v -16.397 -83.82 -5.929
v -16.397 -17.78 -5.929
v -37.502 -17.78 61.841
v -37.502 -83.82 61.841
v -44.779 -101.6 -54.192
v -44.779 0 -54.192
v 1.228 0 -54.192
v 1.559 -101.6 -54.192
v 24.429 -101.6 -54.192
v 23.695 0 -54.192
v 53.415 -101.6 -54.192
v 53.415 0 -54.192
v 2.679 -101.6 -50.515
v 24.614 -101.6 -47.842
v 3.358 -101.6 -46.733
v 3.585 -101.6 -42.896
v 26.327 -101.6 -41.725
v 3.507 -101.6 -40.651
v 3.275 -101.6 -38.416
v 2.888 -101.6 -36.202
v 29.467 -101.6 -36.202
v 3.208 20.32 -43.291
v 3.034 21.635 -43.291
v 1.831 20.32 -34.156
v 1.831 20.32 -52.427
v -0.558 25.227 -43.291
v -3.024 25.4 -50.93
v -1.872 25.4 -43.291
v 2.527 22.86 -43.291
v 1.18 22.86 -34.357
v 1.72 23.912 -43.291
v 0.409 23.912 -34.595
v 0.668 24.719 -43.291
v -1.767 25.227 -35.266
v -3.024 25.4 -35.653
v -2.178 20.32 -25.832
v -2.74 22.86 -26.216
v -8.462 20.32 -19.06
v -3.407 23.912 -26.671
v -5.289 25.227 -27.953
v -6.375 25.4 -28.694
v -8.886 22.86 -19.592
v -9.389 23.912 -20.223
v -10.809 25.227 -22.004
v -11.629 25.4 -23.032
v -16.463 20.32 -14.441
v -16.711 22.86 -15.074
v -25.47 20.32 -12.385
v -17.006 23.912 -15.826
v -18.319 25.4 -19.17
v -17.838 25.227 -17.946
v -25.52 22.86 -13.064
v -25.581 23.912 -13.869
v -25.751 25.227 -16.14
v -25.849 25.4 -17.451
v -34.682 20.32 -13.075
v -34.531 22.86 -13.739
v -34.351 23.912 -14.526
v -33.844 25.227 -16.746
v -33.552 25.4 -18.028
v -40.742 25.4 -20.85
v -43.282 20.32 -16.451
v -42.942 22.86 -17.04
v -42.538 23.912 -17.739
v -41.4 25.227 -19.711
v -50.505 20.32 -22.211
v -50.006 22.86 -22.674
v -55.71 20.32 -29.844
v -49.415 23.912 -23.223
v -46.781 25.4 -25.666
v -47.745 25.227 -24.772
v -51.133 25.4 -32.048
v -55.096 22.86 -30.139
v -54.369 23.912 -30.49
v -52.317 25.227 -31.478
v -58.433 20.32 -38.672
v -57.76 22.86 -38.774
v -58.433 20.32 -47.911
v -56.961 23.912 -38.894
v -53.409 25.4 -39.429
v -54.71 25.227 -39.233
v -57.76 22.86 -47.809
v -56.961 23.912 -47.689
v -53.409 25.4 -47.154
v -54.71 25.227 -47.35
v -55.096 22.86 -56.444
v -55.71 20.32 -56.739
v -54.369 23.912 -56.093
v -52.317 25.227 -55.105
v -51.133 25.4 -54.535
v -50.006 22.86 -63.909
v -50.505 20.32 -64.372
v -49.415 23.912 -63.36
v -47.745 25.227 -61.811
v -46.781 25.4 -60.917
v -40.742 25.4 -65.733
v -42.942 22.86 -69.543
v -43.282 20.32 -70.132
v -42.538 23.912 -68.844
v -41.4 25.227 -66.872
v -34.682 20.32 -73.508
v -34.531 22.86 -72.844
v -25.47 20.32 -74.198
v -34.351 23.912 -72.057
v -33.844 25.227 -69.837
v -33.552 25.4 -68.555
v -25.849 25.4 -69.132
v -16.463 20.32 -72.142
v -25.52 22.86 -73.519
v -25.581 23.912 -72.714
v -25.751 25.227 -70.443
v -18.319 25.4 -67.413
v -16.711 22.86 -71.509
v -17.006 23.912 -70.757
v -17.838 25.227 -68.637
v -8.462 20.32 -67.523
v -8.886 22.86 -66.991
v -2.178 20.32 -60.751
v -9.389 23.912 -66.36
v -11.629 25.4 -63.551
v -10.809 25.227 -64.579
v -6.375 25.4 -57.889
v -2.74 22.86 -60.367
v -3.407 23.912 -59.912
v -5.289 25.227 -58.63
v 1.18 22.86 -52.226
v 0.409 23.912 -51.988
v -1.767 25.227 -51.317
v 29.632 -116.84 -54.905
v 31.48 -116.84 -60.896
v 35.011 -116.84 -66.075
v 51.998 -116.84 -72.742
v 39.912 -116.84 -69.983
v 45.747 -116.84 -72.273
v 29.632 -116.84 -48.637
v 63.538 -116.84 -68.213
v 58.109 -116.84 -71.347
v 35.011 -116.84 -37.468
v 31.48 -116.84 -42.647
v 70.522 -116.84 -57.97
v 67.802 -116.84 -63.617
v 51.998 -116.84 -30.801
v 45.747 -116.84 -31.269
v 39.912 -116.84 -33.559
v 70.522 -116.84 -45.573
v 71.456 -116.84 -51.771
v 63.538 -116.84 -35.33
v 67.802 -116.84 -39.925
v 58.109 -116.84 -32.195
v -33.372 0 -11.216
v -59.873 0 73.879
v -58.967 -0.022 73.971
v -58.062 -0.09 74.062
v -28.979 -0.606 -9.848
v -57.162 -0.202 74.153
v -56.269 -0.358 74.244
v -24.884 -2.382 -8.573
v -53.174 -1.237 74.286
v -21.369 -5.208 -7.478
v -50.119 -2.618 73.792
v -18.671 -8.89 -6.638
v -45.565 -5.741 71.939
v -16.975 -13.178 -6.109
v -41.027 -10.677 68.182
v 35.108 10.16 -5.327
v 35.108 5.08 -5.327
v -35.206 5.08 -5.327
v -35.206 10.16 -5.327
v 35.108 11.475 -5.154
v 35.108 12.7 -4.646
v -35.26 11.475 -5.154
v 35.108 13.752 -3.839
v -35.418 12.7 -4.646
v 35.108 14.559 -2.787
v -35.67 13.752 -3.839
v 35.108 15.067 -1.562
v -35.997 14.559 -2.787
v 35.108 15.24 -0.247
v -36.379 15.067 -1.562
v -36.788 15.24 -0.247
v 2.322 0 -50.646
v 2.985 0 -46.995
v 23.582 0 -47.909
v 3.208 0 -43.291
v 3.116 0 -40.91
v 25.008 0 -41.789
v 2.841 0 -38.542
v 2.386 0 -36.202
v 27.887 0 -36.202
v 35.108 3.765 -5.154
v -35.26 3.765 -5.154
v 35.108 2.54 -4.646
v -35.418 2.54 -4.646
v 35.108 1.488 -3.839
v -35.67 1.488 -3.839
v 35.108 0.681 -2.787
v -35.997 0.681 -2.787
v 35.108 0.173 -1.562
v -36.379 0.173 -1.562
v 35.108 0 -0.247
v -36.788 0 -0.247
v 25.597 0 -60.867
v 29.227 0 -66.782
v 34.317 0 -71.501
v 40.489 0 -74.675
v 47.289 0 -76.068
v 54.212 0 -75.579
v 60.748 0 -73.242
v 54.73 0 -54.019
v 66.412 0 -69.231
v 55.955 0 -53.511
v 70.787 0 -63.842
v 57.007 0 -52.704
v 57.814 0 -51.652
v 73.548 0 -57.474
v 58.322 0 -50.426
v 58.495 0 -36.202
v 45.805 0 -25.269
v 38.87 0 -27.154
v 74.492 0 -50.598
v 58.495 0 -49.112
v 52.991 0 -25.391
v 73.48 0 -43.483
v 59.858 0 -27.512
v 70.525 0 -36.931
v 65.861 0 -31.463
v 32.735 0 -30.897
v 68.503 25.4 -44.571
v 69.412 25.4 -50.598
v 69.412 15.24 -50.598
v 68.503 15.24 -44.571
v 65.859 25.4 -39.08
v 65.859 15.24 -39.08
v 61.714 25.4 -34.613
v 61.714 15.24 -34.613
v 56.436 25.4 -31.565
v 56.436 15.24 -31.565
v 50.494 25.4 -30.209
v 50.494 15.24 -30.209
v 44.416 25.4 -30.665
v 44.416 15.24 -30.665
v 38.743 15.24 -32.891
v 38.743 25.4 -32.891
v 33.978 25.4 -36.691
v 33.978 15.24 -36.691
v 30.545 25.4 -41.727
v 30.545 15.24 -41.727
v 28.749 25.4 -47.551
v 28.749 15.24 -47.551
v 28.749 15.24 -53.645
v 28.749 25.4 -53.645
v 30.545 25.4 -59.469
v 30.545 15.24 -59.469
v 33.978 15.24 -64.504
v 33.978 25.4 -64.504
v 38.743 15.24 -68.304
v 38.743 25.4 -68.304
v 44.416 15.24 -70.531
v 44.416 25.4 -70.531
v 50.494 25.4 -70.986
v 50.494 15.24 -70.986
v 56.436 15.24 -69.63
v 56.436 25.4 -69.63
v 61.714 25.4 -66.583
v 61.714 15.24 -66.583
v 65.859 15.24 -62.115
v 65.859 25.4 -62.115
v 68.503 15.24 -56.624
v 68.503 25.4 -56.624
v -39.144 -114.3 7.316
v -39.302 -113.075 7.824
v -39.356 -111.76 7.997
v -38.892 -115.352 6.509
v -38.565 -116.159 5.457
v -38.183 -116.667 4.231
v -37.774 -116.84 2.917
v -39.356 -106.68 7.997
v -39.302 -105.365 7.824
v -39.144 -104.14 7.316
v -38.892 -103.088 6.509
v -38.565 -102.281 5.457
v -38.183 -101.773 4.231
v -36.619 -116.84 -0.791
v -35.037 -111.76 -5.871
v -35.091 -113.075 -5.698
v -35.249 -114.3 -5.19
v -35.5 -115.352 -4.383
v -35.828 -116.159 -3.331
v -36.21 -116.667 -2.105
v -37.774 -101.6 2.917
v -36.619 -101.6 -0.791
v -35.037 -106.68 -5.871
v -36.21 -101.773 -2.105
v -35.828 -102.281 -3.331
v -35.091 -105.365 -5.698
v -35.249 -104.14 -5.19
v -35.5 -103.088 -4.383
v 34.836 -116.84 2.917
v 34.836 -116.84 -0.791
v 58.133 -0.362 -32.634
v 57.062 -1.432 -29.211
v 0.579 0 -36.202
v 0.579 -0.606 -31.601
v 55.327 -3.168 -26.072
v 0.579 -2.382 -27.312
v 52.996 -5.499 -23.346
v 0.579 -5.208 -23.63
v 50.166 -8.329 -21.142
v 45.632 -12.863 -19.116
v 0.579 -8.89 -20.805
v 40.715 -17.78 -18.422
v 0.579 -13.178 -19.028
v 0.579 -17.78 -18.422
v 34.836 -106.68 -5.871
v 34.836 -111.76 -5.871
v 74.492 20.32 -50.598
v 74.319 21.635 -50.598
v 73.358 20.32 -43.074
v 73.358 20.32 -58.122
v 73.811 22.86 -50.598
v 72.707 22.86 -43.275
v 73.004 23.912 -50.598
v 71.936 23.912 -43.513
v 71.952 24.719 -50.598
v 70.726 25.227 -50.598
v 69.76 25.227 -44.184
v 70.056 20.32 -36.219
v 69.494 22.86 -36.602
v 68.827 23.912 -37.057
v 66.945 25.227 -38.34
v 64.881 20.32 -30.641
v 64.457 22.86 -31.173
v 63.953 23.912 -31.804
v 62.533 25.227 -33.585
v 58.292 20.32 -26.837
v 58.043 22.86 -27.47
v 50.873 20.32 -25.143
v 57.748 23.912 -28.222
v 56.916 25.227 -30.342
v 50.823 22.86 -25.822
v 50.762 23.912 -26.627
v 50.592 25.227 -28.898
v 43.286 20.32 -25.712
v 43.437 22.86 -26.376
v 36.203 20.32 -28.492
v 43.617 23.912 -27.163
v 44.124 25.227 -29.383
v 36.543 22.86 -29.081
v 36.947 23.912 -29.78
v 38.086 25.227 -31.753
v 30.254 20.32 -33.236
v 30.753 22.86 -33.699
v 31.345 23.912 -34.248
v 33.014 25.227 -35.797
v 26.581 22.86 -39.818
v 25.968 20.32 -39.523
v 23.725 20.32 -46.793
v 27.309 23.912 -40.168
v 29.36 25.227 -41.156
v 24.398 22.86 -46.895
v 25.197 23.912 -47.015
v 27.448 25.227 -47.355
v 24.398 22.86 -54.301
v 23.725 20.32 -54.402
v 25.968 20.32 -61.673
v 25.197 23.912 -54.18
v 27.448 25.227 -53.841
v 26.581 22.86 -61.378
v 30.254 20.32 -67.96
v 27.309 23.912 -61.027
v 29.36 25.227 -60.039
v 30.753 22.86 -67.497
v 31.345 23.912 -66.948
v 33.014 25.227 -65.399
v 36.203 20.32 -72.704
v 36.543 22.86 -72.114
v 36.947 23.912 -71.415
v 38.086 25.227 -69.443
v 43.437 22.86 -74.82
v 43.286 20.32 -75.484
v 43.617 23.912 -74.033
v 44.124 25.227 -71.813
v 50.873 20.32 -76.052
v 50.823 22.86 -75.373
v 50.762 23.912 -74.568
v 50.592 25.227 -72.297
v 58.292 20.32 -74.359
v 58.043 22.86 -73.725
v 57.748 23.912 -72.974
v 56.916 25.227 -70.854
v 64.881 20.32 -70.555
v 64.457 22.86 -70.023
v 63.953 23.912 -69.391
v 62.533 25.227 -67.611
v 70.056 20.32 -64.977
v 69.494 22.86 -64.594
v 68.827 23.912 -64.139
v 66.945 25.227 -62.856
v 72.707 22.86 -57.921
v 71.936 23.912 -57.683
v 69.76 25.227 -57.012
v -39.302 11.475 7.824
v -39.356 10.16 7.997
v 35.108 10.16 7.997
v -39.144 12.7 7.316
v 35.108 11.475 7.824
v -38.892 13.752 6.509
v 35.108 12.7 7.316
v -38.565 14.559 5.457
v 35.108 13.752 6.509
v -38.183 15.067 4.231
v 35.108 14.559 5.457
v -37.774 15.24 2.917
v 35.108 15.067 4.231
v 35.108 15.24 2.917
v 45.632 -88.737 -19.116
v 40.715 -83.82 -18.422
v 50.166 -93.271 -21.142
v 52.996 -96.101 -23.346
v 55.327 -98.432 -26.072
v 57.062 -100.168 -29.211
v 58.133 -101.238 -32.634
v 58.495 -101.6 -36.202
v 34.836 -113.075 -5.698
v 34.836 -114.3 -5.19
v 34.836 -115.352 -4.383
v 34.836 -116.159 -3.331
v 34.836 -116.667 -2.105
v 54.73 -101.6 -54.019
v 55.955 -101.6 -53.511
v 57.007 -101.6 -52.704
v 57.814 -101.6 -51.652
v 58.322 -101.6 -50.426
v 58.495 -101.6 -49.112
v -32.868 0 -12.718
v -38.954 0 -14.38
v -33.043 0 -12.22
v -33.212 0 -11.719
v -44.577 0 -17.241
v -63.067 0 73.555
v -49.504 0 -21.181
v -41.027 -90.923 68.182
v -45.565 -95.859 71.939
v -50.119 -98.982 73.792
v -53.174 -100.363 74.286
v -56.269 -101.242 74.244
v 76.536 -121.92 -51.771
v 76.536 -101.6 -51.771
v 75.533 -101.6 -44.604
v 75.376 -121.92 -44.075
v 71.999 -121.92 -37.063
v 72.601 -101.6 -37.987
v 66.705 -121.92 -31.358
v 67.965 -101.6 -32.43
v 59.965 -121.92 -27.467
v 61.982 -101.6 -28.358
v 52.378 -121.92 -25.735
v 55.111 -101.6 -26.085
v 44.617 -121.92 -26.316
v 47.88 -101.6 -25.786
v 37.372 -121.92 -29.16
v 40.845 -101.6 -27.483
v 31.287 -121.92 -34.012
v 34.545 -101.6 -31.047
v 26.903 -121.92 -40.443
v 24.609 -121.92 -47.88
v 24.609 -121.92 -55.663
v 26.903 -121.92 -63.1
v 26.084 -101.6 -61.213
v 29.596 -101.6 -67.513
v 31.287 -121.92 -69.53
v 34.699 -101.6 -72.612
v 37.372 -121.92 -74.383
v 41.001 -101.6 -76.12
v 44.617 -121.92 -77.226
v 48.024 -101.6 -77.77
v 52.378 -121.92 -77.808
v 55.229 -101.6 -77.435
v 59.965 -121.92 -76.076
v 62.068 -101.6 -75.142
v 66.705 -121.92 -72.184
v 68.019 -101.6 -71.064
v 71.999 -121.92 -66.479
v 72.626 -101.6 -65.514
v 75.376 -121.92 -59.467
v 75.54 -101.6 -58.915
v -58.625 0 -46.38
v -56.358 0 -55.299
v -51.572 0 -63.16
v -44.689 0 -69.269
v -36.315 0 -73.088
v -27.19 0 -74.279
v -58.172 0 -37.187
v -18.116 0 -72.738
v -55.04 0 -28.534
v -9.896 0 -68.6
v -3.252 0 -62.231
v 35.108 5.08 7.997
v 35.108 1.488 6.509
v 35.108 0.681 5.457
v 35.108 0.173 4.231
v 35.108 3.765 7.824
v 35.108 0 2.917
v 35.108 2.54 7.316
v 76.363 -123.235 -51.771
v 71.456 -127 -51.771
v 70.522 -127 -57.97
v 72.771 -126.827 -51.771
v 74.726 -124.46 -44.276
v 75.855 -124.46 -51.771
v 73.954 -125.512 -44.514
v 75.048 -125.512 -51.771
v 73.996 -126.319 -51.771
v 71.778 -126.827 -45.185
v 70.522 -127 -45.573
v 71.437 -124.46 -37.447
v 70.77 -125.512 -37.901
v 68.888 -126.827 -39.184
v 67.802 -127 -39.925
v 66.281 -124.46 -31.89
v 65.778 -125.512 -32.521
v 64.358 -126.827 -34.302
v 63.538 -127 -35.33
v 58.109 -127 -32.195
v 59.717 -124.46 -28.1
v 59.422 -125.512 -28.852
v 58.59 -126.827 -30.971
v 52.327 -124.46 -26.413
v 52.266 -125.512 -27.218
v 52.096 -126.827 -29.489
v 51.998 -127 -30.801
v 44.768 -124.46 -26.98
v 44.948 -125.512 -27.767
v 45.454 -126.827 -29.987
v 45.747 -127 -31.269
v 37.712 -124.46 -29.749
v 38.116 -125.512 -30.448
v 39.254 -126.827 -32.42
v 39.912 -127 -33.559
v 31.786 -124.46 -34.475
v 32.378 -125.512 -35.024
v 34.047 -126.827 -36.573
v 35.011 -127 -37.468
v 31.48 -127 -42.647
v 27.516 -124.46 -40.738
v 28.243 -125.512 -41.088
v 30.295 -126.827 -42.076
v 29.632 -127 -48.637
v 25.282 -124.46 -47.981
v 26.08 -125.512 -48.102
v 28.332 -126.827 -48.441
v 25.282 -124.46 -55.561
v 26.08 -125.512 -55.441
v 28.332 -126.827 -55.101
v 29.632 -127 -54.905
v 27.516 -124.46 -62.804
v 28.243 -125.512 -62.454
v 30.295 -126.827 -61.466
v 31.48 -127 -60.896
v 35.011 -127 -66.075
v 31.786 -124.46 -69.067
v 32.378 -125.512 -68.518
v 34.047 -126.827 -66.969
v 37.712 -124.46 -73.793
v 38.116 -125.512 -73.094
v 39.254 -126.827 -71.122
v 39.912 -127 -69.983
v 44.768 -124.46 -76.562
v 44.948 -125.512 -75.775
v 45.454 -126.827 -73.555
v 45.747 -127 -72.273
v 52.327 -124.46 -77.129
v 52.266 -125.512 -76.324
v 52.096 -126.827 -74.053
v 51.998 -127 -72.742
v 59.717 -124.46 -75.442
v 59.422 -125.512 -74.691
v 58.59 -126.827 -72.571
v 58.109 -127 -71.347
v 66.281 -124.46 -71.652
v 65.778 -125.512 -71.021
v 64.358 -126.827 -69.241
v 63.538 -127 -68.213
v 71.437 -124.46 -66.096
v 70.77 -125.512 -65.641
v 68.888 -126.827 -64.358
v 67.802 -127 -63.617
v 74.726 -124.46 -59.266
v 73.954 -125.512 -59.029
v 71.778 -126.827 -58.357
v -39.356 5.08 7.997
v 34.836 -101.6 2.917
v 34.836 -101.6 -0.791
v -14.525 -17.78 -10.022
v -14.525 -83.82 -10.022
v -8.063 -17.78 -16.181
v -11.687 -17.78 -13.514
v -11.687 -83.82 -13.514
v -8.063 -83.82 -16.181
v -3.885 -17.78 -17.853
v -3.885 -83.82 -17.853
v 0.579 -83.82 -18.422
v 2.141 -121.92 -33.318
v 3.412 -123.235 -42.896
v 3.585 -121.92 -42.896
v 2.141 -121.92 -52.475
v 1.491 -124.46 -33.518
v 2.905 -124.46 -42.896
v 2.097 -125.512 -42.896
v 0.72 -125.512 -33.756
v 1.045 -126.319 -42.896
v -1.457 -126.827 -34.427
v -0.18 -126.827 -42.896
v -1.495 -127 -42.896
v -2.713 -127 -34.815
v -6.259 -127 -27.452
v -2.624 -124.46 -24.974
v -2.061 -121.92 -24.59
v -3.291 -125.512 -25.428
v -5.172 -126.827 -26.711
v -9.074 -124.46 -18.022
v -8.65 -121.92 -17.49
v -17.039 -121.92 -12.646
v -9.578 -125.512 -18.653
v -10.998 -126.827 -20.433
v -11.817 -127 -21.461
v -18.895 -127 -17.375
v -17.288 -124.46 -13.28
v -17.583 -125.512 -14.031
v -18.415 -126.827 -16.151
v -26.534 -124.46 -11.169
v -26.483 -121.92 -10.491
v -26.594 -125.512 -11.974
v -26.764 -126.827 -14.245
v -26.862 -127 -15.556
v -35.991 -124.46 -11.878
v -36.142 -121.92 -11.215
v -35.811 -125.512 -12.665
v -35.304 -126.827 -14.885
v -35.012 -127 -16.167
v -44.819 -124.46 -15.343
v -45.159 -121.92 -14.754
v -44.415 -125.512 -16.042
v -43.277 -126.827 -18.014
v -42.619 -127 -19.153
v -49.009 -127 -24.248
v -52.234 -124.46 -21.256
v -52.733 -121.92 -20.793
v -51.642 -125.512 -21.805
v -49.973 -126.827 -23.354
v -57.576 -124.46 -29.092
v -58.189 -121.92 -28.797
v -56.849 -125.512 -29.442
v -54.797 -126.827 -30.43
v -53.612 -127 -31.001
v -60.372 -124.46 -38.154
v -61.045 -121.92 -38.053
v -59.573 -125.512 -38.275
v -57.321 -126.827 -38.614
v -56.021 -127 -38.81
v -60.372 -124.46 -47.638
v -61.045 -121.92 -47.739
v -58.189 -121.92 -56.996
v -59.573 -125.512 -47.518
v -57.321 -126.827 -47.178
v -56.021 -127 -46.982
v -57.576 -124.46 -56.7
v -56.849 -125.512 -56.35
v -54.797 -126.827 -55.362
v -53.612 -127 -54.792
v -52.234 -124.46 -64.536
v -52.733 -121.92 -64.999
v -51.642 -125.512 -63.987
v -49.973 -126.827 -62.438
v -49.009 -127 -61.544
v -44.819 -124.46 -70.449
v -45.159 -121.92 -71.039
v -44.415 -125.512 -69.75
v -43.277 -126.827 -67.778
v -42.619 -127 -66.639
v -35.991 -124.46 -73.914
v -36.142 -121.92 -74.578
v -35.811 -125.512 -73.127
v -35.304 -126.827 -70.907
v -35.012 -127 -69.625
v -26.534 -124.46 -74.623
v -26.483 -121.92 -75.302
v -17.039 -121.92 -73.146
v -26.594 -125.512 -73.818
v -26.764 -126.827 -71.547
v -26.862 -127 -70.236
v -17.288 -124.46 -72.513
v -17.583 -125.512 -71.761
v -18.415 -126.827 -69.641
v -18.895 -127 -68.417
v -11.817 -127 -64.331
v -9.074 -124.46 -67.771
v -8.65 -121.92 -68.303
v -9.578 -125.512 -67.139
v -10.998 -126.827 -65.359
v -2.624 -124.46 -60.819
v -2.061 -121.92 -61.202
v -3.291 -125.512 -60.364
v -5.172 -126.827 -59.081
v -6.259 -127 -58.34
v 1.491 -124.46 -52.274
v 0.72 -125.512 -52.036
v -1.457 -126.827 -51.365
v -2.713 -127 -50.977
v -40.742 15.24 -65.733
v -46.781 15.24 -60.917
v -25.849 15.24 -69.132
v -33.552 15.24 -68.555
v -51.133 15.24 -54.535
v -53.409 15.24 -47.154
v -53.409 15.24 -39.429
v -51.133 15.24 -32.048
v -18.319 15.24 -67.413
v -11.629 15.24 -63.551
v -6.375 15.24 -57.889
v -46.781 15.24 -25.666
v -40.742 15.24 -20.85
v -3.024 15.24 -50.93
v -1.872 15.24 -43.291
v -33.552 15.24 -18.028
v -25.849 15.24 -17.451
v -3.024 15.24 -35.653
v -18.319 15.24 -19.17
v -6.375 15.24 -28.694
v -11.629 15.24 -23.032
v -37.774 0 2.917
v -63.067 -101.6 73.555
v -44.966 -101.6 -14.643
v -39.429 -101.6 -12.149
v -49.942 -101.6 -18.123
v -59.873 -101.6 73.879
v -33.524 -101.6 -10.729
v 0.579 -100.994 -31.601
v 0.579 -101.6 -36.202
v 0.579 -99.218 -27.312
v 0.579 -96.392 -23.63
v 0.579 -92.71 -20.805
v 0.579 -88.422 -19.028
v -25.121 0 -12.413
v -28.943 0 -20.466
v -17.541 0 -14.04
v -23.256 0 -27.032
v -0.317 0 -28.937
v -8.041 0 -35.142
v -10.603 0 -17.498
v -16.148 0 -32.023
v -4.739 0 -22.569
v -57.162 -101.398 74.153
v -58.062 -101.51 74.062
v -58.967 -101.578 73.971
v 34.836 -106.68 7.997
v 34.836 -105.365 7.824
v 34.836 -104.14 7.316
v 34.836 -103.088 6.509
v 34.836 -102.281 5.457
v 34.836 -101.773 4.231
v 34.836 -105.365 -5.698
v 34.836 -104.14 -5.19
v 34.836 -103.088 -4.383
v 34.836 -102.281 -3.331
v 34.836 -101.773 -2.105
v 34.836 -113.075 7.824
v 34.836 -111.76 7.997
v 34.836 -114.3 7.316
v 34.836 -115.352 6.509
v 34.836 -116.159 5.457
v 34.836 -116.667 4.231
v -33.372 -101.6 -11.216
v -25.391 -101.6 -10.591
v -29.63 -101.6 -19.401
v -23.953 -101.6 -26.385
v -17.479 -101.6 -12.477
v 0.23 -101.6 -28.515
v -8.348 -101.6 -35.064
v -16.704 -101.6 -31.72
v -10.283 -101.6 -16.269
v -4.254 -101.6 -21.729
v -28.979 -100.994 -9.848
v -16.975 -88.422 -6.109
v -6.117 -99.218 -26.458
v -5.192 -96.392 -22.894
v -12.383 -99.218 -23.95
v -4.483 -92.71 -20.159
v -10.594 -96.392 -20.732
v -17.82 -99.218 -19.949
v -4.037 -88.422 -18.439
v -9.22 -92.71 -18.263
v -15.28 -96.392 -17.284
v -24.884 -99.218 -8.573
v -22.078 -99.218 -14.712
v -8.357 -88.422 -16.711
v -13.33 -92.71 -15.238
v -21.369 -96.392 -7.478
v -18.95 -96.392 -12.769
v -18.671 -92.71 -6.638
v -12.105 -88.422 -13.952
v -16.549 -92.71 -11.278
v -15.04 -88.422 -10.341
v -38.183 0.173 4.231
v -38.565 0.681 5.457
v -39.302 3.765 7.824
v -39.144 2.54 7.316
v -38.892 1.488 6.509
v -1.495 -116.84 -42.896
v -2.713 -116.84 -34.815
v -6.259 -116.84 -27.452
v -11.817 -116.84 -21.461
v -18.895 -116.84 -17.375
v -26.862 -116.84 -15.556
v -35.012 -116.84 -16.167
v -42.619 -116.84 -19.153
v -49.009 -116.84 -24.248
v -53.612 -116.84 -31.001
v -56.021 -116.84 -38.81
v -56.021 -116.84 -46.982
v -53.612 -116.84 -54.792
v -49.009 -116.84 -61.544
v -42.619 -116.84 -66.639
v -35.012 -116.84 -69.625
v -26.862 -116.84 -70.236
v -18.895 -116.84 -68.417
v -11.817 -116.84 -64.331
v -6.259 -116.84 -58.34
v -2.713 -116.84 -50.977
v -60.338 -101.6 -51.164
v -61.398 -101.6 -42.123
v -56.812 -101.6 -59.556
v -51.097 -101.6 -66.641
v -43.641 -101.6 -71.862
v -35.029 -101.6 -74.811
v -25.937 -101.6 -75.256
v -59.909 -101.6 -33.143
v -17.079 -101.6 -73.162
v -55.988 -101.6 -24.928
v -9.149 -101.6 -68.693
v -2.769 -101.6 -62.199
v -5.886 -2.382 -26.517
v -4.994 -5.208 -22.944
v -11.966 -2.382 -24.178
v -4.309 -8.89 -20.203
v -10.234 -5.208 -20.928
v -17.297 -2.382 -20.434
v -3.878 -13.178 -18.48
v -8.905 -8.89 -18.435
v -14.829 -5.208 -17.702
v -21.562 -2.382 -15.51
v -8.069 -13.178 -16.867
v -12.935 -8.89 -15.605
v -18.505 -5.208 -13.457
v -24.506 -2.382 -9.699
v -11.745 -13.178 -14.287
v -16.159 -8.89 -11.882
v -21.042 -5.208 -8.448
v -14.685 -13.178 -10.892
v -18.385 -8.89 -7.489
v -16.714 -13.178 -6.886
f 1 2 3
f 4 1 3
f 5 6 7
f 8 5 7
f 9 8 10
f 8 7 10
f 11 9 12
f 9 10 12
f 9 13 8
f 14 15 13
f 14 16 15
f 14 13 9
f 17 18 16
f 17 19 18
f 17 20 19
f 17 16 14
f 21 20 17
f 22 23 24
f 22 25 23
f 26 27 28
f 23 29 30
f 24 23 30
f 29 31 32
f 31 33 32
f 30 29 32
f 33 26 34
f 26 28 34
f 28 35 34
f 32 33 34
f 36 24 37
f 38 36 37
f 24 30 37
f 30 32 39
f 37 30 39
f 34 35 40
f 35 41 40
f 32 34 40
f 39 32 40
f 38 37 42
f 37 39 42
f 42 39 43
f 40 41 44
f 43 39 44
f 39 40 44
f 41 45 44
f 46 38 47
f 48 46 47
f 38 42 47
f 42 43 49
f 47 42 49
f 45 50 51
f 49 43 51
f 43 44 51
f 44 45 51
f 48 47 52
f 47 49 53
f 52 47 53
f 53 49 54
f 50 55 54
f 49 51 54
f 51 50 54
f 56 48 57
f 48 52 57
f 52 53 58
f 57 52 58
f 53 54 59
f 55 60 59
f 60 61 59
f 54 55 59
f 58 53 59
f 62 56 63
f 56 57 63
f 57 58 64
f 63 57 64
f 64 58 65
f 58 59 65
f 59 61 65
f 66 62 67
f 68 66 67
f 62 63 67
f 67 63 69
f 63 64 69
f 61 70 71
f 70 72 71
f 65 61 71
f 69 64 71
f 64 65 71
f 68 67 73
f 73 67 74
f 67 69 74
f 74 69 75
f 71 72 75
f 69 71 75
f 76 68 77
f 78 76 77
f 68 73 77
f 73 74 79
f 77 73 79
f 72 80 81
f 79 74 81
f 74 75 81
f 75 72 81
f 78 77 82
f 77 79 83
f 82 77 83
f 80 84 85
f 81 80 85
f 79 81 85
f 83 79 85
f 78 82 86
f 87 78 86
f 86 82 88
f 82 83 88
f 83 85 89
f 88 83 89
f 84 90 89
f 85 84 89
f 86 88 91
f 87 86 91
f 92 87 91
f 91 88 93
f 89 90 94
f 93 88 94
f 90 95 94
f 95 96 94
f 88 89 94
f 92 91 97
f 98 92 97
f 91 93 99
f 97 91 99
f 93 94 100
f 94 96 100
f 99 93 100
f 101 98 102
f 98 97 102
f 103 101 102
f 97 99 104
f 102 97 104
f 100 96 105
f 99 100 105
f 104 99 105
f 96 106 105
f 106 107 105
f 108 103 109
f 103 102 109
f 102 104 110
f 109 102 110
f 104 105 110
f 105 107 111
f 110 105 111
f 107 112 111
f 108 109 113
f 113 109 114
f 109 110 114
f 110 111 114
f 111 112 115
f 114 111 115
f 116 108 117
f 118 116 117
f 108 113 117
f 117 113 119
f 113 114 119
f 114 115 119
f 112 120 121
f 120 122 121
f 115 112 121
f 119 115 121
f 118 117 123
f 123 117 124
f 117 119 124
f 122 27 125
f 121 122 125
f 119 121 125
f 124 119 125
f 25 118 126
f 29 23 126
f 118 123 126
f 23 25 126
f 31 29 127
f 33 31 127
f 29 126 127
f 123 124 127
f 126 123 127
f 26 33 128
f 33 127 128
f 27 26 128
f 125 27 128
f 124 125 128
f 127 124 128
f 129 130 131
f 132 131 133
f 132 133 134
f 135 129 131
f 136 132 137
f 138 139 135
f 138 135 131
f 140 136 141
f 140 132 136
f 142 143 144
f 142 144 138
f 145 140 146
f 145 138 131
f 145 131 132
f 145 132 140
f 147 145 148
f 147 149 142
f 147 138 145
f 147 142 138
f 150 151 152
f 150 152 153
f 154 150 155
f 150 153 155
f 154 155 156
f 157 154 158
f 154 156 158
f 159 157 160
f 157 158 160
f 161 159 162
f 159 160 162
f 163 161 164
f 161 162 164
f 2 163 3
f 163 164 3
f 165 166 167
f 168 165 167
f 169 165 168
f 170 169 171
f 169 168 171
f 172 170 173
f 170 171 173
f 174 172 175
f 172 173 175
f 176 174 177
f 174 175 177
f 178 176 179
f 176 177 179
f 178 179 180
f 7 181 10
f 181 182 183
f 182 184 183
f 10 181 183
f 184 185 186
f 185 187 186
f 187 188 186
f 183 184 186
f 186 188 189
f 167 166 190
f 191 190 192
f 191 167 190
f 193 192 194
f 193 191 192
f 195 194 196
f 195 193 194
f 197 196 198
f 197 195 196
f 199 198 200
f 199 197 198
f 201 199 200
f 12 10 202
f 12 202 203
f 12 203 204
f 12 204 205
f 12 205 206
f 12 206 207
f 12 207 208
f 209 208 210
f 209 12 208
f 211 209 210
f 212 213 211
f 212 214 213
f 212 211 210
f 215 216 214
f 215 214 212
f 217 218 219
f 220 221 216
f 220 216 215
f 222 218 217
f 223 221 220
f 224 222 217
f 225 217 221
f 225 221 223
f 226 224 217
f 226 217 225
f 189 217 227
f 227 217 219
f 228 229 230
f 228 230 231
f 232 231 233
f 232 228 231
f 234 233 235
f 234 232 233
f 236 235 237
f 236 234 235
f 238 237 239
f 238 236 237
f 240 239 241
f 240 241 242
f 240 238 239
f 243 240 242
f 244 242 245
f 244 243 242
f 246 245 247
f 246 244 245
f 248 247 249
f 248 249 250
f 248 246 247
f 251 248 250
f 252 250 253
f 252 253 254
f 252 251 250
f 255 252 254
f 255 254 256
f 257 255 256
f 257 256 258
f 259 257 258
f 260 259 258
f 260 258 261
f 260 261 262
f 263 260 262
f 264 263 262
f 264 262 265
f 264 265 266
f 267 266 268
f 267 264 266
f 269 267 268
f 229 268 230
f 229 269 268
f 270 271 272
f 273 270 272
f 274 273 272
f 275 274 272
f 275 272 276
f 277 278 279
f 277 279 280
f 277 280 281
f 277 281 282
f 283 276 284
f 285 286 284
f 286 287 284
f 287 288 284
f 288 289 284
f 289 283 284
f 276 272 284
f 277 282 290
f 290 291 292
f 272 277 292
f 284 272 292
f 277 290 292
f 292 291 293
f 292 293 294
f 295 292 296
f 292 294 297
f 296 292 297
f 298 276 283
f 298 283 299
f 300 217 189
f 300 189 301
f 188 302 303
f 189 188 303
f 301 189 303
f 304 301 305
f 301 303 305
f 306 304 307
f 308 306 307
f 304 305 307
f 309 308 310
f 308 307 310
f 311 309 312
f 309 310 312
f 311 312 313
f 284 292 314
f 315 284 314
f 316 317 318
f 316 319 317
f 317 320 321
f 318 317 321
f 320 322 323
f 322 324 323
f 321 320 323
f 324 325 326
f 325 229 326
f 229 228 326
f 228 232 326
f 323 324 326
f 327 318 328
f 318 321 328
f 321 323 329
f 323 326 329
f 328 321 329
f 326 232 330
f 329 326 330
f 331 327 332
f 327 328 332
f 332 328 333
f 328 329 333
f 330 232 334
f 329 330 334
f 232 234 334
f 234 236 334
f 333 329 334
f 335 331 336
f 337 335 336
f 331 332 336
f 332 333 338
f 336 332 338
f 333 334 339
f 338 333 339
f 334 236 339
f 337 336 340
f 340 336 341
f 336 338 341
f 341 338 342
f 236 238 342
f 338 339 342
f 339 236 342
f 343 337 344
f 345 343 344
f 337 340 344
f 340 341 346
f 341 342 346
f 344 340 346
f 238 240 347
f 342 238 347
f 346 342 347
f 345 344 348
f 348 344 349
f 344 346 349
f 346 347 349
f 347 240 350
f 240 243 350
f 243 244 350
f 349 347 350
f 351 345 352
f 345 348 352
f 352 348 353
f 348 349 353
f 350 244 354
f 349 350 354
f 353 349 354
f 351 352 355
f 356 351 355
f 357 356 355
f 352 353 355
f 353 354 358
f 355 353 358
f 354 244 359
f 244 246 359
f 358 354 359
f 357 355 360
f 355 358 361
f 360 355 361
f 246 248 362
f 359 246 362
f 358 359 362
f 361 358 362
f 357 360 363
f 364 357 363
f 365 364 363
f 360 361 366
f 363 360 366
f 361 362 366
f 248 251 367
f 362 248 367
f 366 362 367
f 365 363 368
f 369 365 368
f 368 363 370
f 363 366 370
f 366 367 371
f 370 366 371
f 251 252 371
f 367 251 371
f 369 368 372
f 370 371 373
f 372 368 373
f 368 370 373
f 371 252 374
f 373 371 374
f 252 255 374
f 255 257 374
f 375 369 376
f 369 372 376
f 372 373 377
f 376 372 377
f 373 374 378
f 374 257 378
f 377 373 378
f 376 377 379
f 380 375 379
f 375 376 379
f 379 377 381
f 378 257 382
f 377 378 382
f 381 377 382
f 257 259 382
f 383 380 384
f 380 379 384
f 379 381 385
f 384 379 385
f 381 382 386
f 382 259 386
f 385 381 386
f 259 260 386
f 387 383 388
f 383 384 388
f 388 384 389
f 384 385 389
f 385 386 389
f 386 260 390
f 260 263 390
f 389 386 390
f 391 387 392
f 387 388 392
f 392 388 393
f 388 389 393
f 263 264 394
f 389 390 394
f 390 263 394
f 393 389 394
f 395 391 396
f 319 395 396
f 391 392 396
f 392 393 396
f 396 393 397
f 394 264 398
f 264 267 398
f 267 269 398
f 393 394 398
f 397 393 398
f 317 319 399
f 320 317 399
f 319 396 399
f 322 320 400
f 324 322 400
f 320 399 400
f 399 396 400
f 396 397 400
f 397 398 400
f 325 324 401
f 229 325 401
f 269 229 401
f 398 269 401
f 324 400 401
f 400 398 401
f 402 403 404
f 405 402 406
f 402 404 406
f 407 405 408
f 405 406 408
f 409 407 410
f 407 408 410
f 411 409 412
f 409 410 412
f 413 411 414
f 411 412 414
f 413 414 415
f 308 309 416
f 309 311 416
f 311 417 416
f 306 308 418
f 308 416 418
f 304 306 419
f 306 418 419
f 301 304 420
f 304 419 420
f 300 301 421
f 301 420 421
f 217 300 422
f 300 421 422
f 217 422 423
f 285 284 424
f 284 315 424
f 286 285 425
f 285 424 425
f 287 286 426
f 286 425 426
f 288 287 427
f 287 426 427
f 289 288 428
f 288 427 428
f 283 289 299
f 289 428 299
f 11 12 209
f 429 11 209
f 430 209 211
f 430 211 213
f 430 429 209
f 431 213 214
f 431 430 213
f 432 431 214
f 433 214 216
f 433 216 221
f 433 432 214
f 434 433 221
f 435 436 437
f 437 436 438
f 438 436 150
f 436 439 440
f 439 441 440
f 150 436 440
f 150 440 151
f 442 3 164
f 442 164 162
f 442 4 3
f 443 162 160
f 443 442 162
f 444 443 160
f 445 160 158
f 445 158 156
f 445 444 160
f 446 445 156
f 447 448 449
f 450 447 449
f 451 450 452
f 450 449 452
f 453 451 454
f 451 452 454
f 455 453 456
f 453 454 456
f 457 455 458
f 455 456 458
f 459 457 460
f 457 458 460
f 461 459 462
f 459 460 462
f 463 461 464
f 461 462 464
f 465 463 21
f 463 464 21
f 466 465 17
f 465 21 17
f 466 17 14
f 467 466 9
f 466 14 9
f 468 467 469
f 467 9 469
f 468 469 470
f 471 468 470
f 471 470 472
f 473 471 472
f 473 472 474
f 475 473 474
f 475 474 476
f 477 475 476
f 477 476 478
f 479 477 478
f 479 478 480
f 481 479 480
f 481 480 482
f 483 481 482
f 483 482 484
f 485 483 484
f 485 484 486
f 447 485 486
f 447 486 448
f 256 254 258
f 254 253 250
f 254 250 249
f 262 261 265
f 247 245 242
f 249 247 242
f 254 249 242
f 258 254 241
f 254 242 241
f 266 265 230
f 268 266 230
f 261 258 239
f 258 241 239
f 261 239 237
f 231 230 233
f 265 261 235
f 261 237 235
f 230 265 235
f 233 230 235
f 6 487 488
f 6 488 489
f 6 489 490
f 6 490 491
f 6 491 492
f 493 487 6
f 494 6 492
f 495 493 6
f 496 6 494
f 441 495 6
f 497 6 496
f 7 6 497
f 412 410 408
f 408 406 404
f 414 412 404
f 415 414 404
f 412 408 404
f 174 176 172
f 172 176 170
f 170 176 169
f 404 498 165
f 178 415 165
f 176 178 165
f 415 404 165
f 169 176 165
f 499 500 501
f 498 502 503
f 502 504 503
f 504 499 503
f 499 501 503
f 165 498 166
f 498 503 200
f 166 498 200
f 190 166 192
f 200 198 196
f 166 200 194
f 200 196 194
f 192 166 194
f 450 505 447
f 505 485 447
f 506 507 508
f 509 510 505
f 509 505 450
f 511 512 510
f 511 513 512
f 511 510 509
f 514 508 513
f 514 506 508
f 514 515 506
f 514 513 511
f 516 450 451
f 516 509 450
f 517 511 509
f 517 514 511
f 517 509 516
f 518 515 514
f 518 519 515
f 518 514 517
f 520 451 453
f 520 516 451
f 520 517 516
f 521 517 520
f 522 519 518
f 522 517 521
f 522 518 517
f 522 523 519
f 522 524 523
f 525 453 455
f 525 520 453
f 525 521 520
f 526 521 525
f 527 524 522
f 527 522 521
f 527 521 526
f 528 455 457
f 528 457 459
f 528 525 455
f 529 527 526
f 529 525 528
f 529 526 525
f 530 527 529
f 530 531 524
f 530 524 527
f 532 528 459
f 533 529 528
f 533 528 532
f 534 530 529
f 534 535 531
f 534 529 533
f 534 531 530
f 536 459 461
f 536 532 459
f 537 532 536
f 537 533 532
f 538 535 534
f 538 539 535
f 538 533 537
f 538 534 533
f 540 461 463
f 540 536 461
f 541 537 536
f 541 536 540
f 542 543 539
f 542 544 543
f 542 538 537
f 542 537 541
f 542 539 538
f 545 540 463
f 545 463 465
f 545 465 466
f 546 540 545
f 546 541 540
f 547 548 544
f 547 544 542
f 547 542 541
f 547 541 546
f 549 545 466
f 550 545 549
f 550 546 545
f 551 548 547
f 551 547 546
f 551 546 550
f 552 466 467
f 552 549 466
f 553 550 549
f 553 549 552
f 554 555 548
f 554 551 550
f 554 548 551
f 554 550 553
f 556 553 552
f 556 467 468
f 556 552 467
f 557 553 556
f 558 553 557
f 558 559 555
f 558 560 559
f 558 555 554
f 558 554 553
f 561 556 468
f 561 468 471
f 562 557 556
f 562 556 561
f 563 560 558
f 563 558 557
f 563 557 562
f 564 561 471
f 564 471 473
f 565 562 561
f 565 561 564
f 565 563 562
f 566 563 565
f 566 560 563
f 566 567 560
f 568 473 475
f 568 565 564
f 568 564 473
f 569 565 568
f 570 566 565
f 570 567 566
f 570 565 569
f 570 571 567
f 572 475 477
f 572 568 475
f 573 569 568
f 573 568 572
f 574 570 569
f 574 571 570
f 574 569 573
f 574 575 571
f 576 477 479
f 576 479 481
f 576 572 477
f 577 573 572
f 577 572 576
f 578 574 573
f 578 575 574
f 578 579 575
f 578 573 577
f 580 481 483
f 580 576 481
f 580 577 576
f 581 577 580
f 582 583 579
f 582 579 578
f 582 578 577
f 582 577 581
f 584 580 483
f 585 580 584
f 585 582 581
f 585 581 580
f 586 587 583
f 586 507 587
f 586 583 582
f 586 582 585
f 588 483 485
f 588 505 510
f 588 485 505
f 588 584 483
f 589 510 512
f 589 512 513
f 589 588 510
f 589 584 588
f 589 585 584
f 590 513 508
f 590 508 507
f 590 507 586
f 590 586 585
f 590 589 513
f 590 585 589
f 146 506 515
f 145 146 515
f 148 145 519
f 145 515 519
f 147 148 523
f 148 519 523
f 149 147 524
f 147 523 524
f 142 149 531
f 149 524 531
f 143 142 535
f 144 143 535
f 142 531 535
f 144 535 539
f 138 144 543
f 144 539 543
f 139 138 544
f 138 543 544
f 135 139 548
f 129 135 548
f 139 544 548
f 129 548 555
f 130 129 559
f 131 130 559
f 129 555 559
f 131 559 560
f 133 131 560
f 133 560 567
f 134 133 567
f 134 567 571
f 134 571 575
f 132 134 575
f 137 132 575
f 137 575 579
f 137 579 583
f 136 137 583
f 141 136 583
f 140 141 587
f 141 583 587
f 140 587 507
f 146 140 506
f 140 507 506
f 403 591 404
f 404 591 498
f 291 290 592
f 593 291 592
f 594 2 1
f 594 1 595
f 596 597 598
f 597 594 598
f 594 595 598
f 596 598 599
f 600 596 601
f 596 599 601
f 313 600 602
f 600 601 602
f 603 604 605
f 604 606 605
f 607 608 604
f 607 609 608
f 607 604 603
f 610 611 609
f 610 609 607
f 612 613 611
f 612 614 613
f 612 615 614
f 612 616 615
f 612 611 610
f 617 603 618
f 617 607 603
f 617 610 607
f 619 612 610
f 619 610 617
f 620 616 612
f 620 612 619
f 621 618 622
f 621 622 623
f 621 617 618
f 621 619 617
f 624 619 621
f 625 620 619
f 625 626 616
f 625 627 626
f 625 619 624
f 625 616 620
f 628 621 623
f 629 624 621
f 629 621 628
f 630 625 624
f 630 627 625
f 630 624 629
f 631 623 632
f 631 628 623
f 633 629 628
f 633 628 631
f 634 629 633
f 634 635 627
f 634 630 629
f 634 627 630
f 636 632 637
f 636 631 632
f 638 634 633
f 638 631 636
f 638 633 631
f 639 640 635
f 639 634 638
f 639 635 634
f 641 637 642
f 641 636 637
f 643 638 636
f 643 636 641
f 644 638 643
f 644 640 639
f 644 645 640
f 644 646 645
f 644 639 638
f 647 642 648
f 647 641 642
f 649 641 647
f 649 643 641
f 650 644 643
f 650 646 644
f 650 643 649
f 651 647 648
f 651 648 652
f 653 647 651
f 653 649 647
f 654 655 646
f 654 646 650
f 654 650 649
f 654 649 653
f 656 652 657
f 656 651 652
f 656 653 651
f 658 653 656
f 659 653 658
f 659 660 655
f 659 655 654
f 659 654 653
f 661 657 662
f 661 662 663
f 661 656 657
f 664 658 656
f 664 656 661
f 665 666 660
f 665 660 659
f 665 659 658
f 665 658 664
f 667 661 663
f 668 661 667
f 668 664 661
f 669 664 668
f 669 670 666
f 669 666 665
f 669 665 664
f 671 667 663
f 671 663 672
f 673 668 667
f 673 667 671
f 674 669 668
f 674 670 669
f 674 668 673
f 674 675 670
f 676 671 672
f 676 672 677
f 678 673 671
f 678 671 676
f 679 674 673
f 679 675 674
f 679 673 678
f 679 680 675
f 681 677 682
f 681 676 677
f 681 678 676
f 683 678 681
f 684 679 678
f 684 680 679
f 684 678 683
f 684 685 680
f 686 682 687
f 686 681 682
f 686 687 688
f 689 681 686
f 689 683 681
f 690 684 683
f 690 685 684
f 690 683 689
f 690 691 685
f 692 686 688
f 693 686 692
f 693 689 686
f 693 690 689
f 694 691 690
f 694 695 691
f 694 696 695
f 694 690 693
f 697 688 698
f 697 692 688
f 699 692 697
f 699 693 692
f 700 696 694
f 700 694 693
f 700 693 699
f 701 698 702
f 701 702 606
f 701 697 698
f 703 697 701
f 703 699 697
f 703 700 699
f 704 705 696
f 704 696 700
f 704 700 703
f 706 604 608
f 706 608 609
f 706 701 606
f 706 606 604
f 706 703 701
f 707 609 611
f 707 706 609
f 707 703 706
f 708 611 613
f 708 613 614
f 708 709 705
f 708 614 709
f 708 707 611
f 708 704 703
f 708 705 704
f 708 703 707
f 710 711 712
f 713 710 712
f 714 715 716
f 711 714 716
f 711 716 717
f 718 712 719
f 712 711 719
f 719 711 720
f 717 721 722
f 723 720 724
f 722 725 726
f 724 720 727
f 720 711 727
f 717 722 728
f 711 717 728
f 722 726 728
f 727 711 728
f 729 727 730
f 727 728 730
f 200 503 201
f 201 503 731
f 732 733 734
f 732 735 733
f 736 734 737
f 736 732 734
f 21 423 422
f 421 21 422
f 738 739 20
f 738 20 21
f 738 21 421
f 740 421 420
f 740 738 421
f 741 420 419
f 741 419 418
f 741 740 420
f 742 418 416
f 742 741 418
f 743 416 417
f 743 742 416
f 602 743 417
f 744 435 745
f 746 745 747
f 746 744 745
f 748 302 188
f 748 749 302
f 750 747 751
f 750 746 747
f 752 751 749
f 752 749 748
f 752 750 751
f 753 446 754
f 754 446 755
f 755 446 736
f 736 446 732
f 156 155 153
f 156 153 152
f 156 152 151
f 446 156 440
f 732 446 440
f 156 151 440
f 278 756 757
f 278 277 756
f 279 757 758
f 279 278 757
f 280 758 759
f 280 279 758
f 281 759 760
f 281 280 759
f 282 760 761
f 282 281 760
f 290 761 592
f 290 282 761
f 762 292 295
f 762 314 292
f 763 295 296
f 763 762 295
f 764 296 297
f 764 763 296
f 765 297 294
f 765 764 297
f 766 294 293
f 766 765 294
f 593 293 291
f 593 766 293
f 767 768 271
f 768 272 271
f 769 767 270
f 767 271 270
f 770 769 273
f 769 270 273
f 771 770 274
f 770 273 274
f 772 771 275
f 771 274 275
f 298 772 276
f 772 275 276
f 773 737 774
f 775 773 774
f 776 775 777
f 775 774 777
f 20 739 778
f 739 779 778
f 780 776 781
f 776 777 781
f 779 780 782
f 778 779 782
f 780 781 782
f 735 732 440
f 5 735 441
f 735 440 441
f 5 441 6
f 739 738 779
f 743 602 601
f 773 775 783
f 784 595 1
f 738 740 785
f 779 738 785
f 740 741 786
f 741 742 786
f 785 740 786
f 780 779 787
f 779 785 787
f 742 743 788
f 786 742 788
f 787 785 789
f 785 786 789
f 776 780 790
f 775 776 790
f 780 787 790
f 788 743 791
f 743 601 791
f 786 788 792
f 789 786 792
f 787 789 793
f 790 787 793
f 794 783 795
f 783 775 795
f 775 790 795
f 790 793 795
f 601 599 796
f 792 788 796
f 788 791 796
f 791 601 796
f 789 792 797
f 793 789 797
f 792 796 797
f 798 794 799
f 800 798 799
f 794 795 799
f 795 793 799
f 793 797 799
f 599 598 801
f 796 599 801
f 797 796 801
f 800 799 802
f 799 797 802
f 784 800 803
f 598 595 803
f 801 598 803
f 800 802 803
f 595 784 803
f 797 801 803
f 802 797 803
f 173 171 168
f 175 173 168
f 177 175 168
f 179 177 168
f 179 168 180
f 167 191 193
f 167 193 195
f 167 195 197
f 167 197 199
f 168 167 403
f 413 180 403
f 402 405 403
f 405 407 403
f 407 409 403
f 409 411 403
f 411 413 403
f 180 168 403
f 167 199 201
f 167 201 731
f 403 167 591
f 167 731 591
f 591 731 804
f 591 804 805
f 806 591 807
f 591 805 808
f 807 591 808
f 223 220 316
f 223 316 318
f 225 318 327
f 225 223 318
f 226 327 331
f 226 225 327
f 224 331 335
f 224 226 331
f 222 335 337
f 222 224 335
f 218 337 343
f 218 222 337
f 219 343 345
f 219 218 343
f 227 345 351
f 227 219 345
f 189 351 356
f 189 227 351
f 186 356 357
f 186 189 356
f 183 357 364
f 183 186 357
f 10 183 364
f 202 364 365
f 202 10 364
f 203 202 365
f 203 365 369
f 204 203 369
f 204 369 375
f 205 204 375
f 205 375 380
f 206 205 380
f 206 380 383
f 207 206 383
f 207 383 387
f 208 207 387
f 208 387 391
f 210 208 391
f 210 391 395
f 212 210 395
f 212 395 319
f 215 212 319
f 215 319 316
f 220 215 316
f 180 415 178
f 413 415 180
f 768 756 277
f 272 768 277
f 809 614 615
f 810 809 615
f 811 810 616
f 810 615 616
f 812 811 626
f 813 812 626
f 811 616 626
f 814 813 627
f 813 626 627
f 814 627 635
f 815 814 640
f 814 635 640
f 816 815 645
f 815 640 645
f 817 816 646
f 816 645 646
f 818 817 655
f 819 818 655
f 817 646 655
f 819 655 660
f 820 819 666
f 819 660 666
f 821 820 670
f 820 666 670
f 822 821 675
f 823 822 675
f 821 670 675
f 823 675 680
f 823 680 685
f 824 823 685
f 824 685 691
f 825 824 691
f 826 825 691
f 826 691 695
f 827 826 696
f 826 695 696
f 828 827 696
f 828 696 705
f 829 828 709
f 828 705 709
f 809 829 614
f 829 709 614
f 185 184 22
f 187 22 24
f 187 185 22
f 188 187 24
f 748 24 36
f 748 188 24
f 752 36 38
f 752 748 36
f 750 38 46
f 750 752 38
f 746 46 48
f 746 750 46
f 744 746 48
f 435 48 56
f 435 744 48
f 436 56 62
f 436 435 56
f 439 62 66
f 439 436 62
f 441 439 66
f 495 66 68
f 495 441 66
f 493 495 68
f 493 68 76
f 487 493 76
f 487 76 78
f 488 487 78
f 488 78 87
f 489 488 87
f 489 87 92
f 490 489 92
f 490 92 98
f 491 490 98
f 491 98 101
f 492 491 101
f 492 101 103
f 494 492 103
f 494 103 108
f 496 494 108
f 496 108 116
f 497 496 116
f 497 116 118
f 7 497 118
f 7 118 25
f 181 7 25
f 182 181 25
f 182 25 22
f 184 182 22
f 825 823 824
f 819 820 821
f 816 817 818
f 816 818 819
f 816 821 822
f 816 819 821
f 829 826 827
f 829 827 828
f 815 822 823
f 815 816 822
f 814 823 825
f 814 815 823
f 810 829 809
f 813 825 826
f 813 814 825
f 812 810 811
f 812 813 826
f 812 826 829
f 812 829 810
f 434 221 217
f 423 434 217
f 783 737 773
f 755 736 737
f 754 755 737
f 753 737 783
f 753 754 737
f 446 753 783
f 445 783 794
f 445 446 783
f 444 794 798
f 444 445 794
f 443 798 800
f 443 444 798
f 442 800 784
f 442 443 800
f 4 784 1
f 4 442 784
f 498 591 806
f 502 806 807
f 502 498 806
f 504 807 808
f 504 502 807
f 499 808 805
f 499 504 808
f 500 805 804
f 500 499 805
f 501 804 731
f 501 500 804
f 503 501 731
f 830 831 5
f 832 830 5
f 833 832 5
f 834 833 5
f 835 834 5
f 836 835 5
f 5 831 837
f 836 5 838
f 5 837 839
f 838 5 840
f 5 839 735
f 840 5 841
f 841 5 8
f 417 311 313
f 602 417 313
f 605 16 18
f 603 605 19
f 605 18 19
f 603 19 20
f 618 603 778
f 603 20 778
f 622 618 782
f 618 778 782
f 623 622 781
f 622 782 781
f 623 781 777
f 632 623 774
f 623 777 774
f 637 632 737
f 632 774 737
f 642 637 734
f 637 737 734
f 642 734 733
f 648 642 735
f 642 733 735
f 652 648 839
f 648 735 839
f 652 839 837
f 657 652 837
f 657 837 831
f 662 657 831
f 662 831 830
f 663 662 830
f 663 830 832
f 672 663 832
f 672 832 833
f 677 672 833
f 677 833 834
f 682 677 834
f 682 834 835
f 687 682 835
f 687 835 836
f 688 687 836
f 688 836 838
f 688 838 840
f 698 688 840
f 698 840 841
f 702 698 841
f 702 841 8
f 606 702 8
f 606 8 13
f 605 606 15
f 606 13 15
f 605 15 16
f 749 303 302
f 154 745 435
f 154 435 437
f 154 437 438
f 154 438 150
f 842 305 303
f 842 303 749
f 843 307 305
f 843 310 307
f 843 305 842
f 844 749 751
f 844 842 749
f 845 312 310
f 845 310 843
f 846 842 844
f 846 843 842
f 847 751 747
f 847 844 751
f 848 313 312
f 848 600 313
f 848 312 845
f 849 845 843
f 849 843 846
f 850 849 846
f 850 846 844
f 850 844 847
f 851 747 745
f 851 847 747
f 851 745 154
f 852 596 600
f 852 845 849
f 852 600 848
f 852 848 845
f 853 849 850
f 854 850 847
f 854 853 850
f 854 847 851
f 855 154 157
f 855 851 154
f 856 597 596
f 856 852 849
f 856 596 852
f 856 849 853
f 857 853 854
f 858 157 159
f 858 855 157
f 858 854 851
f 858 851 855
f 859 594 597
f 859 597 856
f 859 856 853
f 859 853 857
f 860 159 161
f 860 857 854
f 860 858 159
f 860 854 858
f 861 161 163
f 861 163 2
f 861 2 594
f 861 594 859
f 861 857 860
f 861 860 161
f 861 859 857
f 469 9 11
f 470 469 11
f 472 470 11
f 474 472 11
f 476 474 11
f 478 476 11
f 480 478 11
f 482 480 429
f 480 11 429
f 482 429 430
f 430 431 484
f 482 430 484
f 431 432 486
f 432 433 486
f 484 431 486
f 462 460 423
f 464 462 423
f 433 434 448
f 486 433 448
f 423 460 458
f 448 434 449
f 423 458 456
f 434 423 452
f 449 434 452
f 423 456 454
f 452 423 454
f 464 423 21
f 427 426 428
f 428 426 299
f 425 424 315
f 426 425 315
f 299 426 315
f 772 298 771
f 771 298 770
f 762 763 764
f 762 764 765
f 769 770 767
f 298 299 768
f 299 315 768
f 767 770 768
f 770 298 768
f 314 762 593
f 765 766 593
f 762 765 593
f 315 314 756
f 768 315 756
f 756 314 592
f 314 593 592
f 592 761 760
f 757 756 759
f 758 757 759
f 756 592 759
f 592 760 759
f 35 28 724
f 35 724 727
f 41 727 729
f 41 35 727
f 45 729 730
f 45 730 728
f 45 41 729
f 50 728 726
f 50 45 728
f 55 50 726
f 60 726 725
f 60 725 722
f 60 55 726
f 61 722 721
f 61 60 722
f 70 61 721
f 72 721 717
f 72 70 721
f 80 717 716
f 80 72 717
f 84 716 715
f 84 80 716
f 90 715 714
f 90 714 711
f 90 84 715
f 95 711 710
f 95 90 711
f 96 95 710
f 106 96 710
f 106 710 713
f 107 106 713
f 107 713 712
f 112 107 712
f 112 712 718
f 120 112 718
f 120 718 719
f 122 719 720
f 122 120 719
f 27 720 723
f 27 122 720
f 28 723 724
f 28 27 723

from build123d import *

# Parameters (mm, degrees)
F1_DEPTH  = 101.6
F2_F1_R   = 17.78
F2_F2_R   = 17.78
F3_R      = 25.5257149729
F3_R_2    = 30.9932269238
F4_DEPTH  = 25.4
F5_R      = 32.4962877328
F5_R_2    = 26.1094641949
F6_DEPTH  = 25.4
F8_DEPTH  = 15.24
F9_R      = 5.08
F11_DEPTH = 15.24
F12_R     = 5.08
F12_2_R   = 5.08
F13_R     = 5.08
F14_DEPTH = 10.16
F15_DEPTH = 10.16
F16_DEPTH = 10.16


with BuildPart() as f1:
    # F0 (on Front) → F1 (new body)
    with BuildSketch(Plane.XZ):
        Polygon((-12.505765073, -18.4224713594), (-41.8203547597, 75.7069438696), (-63.0667060614, 73.5554099083), (-44.7787046432, -54.1916489601), (58.4947057068, -54.1916489601), (58.4947057068, -18.4224713594), align=None)
    extrude(amount=F1_DEPTH)

    # F2: fillet of radius 17.78 on 5 edges, made by hand

    # F2_f1
    f2_f1_edges = [f1.edges().sort_by_distance(p)[0] for p in [
        (-12.505765073, -50.8, -18.4224713594),
    ]]
    fillet(f2_f1_edges, radius=F2_F1_R)

    # F2_f2
    f2_f2_edges = [f1.edges().sort_by_distance(p)[0] for p in [
        (29.5370058814, -101.6, -18.4224713594),
        (29.5370058814, 0, -18.4224713594),
        (58.4947057068, -50.8, -18.4224713594),
        (-41.8203547597, -50.8, 75.7069438696),
        (-9.9594288223, 0, -14.9625086208),
        (-9.9594288223, -101.6, -14.9625086208),
    ]]
    fillet(f2_f2_edges, radius=F2_F2_R)

    # F3 (on Front) → F4 (join)
    with BuildSketch(Plane.XZ):
        with Locations((48.9659570158, -50.5978167057)):
            Circle(F3_R)
        with Locations((-27.7856793255, -43.291490525)):
            Circle(F3_R_2)
    extrude(amount=-F4_DEPTH)

    # F5 (on face) → F6 (join)
    with BuildSketch(Plane.XZ.offset(101.6)):
        with Locations((-28.9111752063, -42.8961217403)):
            Circle(F5_R)
        with Locations((50.4264719784, -51.7711788416)):
            Circle(F5_R_2)
    extrude(amount=F6_DEPTH)

    # F13
    f13_edges = [f1.edges().sort_by_distance(p)[0] for p in [
        (-61.407463, -127, -42.896122),
        (24.317008, -127, -51.771179),
        (23.440242, 25.4, -50.597817),
        (-58.778906, 25.4, -43.291491),
        (58.494706, -50.8, -54.191649),
    ]]
    fillet(f13_edges, radius=F13_R)

    # F14 (cut): a face of the model
    f14_faces = [f1.faces().sort_by_distance(p)[0] for p in [
        (50.4264719784, -127, -51.7711788416),
    ]]
    extrude(f14_faces, amount=-F14_DEPTH, mode=Mode.SUBTRACT)

    # F15 (cut): faces of the model
    f15_faces = [f1.faces().sort_by_distance(p)[0] for p in [
        (48.9659570158, 25.4, -50.5978167057),
        (-27.7856793255, 25.4, -43.291490525),
    ]]
    extrude(f15_faces, amount=-F15_DEPTH, mode=Mode.SUBTRACT)

    # F16 (cut): a face of the model
    f16_faces = [f1.faces().sort_by_distance(p)[0] for p in [
        (-28.9111752063, -127, -42.8961217403),
    ]]
    extrude(f16_faces, amount=-F16_DEPTH, mode=Mode.SUBTRACT)


with BuildPart() as f8:
    # F7 (on face) → F8 (new body)
    with BuildSketch(Plane.XZ.offset(101.6)):
        Polygon((34.8361097276, 7.9966569319), (-39.355707759, 7.9966569319), (-35.0370473262, -5.8706011623), (34.8361097276, -5.8706011623), align=None)
    extrude(amount=F8_DEPTH)

    # F9
    f9_edges = [f8.edges().sort_by_distance(p)[0] for p in [
        (-2.259799, -116.84, 7.996657),
        (-0.100469, -116.84, -5.870601),
        (-2.259799, -101.6, 7.996657),
    ]]
    fillet(f9_edges, radius=F9_R)

    # F12#2
    f12_2_edges = [f8.edges().sort_by_distance(p)[0] for p in [
        (-0.100469, -101.6, -5.870601),
    ]]
    fillet(f12_2_edges, radius=F12_2_R)


with BuildPart() as f11:
    # F10 (on face) → F11 (new body)
    with BuildSketch(Plane(origin=(0, 0, 0), x_dir=(-1, 0, 0), z_dir=(0, 1, 0))):
        Polygon((39.355707759, 7.9966569319), (-35.1080186665, 7.9966569319), (-35.1080186665, -5.3267870098), (35.206406593, -5.3267870098), align=None)
    extrude(amount=F11_DEPTH)

    # F12
    f12_edges = [f11.edges().sort_by_distance(p)[0] for p in [
        (-2.123845, 15.24, 7.996657),
        (-2.123845, 0, 7.996657),
        (-0.049194, 15.24, -5.326787),
        (-0.049194, 0, -5.326787),
    ]]
    fillet(f12_edges, radius=F12_R)


solid = Compound([f1.part, f8.part, f11.part])
